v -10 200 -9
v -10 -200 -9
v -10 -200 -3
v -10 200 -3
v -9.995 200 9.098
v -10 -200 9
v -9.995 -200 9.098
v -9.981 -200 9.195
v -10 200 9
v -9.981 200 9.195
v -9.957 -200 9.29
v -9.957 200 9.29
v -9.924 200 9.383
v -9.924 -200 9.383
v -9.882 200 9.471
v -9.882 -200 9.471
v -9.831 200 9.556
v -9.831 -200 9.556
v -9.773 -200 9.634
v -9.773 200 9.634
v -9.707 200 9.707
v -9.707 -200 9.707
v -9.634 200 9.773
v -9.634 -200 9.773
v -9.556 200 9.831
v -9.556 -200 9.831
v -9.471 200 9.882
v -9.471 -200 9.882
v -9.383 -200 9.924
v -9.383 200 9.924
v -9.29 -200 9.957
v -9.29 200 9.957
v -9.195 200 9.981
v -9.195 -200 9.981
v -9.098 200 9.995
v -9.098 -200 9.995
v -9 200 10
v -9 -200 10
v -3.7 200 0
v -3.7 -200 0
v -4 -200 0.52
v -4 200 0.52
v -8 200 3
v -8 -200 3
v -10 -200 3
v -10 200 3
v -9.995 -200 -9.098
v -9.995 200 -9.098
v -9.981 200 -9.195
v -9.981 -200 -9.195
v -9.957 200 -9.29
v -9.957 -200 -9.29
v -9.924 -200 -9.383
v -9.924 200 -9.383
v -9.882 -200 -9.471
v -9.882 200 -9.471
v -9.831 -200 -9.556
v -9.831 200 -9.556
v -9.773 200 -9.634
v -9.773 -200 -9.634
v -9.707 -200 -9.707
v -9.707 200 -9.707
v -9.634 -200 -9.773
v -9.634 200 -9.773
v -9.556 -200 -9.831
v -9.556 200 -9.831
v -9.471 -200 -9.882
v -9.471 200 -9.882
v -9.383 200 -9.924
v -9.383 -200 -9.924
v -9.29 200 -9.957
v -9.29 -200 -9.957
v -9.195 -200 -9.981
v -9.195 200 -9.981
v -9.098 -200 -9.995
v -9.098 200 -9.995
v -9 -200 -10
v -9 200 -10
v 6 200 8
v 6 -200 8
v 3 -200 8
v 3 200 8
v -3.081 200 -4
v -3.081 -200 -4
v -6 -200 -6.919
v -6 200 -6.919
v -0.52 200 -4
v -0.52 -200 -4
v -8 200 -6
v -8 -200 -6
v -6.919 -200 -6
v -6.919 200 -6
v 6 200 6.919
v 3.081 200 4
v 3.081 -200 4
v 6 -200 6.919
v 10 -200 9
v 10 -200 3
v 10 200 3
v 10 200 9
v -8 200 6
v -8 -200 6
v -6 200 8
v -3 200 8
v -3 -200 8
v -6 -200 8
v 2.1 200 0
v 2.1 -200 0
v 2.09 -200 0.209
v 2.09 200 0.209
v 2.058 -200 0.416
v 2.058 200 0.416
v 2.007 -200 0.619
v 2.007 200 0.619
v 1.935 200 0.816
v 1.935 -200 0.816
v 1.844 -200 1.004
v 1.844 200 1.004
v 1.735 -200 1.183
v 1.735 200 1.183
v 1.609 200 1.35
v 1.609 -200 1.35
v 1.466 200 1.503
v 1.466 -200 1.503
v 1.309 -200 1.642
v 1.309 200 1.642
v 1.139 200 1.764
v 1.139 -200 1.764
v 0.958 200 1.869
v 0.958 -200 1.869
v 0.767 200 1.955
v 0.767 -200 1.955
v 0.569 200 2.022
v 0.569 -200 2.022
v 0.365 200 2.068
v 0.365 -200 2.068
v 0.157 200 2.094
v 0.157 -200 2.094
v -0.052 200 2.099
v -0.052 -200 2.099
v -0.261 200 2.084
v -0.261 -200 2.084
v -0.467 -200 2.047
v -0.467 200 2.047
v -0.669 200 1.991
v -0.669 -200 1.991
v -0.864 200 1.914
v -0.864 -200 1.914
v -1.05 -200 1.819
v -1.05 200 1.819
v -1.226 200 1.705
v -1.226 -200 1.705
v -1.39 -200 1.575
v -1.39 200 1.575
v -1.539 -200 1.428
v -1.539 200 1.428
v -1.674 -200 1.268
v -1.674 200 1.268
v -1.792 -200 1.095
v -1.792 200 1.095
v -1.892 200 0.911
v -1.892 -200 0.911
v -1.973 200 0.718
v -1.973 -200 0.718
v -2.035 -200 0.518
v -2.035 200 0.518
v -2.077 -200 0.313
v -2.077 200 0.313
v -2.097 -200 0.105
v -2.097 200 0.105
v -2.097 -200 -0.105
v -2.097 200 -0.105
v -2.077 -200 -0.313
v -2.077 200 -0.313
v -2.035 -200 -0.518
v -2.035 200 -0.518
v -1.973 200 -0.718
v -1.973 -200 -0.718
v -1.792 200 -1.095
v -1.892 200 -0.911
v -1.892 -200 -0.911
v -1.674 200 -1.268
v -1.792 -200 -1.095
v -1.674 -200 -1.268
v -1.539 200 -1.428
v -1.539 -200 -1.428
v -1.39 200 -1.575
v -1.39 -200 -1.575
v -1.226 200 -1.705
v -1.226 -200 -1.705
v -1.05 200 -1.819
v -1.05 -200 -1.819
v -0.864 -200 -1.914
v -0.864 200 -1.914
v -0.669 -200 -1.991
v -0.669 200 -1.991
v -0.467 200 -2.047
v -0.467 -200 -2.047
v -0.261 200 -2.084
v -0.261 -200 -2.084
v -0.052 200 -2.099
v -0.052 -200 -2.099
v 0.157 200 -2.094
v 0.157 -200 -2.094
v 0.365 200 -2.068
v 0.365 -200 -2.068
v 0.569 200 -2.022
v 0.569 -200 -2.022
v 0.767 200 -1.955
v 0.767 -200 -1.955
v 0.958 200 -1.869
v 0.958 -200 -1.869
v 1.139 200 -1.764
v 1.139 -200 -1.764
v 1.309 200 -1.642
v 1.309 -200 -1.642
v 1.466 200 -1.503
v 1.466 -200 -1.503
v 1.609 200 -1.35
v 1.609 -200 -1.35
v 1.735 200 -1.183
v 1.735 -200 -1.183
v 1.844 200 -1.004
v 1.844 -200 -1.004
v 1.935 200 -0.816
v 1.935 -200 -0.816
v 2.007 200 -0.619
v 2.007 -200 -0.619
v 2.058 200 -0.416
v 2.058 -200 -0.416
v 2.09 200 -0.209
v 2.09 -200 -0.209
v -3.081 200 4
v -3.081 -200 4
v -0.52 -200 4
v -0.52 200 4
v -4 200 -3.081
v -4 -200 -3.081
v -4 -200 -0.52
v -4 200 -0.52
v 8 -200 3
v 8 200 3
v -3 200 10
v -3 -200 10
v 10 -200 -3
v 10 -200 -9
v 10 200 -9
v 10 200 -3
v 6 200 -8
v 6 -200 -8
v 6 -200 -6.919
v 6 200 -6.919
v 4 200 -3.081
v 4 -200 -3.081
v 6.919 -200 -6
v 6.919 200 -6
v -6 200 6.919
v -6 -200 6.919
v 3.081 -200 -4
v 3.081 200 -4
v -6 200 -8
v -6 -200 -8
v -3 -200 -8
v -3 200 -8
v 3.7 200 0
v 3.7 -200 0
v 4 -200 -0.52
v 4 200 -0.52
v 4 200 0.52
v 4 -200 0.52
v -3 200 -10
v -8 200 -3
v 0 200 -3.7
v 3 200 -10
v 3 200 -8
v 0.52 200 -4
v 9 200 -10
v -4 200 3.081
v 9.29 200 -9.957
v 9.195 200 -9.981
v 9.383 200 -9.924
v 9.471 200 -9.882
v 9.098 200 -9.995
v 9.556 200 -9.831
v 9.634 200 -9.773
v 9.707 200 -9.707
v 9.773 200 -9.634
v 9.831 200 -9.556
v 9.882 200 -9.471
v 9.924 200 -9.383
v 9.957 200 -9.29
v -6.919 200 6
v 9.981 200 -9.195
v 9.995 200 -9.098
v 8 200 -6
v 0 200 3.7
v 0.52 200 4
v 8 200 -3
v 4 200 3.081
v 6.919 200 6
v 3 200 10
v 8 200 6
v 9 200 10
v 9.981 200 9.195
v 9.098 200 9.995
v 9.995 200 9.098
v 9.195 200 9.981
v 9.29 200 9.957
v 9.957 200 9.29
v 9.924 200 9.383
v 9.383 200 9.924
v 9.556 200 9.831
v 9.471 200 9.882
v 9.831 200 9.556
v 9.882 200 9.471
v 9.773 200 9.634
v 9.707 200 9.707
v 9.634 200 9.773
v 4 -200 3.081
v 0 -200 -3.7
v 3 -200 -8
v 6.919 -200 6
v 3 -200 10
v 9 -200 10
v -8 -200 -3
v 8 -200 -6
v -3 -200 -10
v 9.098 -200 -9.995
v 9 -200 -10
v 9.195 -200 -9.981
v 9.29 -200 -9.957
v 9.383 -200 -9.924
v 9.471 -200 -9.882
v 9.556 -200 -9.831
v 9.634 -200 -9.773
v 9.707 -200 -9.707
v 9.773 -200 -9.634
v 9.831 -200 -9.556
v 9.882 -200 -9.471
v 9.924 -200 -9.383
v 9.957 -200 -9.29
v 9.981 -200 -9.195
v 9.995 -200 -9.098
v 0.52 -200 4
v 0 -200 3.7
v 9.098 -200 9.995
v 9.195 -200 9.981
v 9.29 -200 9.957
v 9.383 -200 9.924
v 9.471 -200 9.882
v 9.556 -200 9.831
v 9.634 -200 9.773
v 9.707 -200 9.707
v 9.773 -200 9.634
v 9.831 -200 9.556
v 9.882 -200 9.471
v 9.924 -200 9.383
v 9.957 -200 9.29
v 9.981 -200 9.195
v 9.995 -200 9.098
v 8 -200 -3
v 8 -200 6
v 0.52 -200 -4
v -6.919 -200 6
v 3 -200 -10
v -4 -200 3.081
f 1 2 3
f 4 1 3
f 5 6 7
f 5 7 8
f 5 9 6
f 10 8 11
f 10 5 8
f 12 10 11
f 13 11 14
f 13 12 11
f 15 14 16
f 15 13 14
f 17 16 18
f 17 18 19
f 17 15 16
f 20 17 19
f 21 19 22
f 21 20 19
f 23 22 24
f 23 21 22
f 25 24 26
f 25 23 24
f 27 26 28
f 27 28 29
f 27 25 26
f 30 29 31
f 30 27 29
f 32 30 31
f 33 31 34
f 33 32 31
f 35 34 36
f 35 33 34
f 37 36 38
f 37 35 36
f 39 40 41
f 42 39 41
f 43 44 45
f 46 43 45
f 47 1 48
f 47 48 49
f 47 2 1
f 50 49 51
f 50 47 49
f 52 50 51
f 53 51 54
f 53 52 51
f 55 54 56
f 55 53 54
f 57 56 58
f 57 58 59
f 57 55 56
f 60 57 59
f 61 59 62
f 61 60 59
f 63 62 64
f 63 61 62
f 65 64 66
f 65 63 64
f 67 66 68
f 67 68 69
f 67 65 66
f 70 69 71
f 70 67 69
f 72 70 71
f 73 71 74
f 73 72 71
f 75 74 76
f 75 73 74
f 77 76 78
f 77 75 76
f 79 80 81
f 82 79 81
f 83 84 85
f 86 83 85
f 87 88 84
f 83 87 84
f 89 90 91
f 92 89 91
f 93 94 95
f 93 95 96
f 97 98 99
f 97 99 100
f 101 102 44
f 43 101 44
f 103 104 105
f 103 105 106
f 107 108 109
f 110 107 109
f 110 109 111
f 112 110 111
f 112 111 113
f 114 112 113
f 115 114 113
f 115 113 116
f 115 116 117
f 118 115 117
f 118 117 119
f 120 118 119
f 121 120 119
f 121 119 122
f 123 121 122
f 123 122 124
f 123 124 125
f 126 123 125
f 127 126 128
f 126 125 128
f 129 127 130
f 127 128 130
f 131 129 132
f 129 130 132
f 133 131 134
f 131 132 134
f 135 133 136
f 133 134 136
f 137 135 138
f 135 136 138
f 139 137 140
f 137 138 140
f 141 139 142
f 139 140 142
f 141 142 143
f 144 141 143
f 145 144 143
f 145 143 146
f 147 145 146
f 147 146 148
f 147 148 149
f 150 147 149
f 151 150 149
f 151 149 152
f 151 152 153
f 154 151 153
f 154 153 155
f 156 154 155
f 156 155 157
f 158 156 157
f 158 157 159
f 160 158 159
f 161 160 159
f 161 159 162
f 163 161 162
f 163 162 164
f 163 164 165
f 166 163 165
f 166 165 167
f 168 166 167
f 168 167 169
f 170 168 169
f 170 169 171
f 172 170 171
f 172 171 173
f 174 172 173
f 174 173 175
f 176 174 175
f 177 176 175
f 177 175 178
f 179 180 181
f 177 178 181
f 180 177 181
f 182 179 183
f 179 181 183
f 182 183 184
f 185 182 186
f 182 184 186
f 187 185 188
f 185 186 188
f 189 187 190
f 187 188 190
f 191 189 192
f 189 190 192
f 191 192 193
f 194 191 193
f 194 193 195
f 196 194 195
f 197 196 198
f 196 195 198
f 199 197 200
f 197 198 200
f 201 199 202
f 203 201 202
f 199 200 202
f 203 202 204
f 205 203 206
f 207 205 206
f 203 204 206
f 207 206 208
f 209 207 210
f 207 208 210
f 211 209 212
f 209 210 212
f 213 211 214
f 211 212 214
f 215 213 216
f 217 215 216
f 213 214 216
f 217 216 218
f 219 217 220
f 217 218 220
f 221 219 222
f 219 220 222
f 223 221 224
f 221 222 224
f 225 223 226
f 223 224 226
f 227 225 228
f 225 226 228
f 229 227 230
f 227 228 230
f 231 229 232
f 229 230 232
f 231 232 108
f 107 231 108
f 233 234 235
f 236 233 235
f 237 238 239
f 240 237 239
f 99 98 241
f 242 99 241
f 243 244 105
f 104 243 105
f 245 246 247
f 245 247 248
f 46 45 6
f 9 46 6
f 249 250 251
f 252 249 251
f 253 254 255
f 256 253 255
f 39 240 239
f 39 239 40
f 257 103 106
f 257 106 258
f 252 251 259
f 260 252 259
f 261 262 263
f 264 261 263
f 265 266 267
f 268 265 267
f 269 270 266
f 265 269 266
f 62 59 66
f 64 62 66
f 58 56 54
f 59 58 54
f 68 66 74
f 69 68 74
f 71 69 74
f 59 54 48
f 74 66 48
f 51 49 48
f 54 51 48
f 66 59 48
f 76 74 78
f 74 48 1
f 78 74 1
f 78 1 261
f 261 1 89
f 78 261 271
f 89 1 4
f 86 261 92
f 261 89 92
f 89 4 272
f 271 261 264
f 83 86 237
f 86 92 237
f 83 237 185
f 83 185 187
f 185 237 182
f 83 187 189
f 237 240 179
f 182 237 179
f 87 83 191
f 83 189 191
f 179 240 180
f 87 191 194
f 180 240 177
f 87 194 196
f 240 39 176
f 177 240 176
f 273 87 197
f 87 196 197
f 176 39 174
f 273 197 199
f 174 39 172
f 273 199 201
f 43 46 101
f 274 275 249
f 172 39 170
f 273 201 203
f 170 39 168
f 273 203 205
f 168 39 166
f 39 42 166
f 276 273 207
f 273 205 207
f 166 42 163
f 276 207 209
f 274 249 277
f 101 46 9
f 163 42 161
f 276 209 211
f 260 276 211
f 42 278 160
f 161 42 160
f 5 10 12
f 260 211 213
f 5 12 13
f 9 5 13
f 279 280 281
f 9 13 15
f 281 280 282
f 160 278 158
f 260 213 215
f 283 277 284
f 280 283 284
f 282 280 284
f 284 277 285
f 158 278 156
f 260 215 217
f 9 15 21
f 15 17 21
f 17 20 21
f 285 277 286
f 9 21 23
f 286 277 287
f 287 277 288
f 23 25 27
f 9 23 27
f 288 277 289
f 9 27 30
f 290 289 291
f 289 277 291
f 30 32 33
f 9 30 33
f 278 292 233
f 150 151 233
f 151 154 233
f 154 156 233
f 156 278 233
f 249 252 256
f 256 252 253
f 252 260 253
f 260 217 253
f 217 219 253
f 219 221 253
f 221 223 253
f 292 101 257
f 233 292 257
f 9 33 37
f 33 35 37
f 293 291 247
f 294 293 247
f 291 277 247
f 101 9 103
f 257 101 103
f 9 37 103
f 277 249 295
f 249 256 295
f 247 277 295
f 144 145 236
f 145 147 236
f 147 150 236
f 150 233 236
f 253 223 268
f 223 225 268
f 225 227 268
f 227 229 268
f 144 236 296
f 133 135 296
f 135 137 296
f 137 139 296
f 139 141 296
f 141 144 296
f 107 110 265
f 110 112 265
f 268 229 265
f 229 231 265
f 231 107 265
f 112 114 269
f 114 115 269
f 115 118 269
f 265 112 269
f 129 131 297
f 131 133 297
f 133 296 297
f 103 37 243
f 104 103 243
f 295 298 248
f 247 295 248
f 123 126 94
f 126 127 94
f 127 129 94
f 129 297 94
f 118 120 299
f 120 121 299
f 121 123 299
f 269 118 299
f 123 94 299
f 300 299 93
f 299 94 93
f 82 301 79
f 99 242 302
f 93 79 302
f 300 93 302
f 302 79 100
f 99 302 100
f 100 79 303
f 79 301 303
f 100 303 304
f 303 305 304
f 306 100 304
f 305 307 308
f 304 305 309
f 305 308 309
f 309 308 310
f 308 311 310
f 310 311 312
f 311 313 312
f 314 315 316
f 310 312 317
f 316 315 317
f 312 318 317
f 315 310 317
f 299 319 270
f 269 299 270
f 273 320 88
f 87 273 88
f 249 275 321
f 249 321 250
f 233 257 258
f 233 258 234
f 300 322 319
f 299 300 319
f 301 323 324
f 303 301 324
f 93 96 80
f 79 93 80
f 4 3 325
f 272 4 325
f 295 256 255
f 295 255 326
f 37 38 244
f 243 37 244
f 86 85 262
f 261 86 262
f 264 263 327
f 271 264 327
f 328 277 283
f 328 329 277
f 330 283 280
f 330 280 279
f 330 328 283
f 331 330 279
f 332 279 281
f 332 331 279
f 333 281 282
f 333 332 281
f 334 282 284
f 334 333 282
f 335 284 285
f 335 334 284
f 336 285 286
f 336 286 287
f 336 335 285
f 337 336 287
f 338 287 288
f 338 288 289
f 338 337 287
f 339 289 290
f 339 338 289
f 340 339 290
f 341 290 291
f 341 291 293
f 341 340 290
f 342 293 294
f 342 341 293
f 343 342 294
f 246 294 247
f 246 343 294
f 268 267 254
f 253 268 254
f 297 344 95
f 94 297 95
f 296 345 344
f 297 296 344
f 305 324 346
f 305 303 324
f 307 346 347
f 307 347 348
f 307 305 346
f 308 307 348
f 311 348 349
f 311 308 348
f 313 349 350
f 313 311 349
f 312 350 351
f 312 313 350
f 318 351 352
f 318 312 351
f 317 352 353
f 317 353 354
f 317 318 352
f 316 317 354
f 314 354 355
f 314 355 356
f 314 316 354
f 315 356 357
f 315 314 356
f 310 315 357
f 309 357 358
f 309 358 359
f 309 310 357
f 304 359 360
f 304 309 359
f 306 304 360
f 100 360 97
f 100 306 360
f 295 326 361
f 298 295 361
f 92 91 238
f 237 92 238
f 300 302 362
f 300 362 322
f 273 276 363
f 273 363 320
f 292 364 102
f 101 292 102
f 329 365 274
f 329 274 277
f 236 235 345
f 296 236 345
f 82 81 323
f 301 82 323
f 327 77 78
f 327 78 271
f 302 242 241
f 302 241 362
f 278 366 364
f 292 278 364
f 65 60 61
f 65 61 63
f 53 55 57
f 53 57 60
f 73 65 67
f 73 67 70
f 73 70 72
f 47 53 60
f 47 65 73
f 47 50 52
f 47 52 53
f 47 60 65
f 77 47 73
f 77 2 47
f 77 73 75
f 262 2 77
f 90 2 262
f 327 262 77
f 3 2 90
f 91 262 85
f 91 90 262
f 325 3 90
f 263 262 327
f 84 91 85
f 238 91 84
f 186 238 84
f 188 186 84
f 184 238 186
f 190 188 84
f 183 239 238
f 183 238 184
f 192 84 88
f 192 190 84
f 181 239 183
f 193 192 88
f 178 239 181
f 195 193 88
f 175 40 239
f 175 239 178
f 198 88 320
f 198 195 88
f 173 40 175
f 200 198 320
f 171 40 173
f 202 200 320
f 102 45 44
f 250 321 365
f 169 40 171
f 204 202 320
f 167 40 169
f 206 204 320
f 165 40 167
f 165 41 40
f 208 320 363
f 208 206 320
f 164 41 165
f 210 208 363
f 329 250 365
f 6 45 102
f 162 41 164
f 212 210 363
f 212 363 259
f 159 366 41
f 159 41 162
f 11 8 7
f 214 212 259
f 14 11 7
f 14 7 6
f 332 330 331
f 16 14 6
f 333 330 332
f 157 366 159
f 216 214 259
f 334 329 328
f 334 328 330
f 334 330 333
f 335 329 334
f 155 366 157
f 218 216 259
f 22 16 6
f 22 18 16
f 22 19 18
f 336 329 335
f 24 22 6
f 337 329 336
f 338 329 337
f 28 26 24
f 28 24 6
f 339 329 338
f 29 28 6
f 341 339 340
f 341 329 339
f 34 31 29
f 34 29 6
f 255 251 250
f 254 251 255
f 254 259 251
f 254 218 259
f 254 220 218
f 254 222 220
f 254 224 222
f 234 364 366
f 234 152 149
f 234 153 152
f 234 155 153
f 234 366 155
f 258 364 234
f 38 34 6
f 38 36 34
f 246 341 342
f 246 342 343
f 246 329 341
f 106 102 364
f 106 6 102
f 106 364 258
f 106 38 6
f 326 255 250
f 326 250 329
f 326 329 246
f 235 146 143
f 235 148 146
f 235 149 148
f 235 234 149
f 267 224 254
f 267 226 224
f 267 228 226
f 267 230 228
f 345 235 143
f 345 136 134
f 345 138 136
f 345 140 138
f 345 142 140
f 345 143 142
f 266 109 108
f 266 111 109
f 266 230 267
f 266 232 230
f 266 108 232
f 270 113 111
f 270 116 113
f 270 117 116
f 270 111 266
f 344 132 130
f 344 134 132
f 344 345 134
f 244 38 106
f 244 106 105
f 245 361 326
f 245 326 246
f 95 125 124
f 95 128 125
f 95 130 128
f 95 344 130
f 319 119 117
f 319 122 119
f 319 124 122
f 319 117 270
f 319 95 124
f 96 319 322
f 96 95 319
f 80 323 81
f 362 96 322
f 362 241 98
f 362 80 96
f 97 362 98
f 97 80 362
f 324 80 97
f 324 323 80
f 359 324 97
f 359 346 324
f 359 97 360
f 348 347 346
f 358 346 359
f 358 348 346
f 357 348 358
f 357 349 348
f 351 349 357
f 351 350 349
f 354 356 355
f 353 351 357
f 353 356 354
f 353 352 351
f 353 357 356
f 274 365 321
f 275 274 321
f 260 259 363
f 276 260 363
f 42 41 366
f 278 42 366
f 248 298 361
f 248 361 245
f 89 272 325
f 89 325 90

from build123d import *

# Parameters (mm, degrees)
SKETCH_W           = 20
SKETCH_H           = 20
PAD_DEPTH          = 200
POCKET_DEPTH       = 1201.998506
POLARPATTERN_COUNT = 4
SKETCH002_R        = 2.1
POCKET001_DEPTH    = 400.001
FILLET_R           = 1


with BuildPart() as part:
    # Sketch → Pad (new body, symmetric)
    with BuildSketch(Plane.XZ):
        Rectangle(SKETCH_W, SKETCH_H)
    extrude(amount=PAD_DEPTH, both=True)

    # Sketch001 (on Face6 of Pad) → Pocket (cut, through all)
    with BuildSketch(Plane.XZ.offset(200)):
        Polygon((-3, 10), (-3, 8), (-6, 8), (-6, 6.919239), (-3.080761, 4), (-0.519615, 4), (0, 3.7), (0.519615, 4), (3.080761, 4), (6, 6.919239), (6, 8), (3, 8), (3, 10), align=None)
    pocket = extrude(amount=-POCKET_DEPTH, mode=Mode.SUBTRACT)

    # PolarPattern: Pocket ×4 about axis
    polarpattern_axis = Axis((0, -200, 0), (0, -1, 0))
    for i in range(1, POLARPATTERN_COUNT):
        add(pocket.rotate(polarpattern_axis, i * 360 / POLARPATTERN_COUNT), mode=Mode.SUBTRACT)

    # Sketch002 (on Face4 of PolarPattern) → Pocket001 (cut, through all)
    with BuildSketch(Plane.XZ.offset(200)):
        Circle(SKETCH002_R)
    extrude(amount=-POCKET001_DEPTH, mode=Mode.SUBTRACT)

    # Fillet
    fillet_edges = [part.edges().sort_by_distance(p)[0] for p in [
        (-10, 0, 10),
        (10, 0, 10),
        (10, 0, -10),
        (-10, 0, -10),
    ]]
    fillet(fillet_edges, radius=FILLET_R)


solid = part.part
